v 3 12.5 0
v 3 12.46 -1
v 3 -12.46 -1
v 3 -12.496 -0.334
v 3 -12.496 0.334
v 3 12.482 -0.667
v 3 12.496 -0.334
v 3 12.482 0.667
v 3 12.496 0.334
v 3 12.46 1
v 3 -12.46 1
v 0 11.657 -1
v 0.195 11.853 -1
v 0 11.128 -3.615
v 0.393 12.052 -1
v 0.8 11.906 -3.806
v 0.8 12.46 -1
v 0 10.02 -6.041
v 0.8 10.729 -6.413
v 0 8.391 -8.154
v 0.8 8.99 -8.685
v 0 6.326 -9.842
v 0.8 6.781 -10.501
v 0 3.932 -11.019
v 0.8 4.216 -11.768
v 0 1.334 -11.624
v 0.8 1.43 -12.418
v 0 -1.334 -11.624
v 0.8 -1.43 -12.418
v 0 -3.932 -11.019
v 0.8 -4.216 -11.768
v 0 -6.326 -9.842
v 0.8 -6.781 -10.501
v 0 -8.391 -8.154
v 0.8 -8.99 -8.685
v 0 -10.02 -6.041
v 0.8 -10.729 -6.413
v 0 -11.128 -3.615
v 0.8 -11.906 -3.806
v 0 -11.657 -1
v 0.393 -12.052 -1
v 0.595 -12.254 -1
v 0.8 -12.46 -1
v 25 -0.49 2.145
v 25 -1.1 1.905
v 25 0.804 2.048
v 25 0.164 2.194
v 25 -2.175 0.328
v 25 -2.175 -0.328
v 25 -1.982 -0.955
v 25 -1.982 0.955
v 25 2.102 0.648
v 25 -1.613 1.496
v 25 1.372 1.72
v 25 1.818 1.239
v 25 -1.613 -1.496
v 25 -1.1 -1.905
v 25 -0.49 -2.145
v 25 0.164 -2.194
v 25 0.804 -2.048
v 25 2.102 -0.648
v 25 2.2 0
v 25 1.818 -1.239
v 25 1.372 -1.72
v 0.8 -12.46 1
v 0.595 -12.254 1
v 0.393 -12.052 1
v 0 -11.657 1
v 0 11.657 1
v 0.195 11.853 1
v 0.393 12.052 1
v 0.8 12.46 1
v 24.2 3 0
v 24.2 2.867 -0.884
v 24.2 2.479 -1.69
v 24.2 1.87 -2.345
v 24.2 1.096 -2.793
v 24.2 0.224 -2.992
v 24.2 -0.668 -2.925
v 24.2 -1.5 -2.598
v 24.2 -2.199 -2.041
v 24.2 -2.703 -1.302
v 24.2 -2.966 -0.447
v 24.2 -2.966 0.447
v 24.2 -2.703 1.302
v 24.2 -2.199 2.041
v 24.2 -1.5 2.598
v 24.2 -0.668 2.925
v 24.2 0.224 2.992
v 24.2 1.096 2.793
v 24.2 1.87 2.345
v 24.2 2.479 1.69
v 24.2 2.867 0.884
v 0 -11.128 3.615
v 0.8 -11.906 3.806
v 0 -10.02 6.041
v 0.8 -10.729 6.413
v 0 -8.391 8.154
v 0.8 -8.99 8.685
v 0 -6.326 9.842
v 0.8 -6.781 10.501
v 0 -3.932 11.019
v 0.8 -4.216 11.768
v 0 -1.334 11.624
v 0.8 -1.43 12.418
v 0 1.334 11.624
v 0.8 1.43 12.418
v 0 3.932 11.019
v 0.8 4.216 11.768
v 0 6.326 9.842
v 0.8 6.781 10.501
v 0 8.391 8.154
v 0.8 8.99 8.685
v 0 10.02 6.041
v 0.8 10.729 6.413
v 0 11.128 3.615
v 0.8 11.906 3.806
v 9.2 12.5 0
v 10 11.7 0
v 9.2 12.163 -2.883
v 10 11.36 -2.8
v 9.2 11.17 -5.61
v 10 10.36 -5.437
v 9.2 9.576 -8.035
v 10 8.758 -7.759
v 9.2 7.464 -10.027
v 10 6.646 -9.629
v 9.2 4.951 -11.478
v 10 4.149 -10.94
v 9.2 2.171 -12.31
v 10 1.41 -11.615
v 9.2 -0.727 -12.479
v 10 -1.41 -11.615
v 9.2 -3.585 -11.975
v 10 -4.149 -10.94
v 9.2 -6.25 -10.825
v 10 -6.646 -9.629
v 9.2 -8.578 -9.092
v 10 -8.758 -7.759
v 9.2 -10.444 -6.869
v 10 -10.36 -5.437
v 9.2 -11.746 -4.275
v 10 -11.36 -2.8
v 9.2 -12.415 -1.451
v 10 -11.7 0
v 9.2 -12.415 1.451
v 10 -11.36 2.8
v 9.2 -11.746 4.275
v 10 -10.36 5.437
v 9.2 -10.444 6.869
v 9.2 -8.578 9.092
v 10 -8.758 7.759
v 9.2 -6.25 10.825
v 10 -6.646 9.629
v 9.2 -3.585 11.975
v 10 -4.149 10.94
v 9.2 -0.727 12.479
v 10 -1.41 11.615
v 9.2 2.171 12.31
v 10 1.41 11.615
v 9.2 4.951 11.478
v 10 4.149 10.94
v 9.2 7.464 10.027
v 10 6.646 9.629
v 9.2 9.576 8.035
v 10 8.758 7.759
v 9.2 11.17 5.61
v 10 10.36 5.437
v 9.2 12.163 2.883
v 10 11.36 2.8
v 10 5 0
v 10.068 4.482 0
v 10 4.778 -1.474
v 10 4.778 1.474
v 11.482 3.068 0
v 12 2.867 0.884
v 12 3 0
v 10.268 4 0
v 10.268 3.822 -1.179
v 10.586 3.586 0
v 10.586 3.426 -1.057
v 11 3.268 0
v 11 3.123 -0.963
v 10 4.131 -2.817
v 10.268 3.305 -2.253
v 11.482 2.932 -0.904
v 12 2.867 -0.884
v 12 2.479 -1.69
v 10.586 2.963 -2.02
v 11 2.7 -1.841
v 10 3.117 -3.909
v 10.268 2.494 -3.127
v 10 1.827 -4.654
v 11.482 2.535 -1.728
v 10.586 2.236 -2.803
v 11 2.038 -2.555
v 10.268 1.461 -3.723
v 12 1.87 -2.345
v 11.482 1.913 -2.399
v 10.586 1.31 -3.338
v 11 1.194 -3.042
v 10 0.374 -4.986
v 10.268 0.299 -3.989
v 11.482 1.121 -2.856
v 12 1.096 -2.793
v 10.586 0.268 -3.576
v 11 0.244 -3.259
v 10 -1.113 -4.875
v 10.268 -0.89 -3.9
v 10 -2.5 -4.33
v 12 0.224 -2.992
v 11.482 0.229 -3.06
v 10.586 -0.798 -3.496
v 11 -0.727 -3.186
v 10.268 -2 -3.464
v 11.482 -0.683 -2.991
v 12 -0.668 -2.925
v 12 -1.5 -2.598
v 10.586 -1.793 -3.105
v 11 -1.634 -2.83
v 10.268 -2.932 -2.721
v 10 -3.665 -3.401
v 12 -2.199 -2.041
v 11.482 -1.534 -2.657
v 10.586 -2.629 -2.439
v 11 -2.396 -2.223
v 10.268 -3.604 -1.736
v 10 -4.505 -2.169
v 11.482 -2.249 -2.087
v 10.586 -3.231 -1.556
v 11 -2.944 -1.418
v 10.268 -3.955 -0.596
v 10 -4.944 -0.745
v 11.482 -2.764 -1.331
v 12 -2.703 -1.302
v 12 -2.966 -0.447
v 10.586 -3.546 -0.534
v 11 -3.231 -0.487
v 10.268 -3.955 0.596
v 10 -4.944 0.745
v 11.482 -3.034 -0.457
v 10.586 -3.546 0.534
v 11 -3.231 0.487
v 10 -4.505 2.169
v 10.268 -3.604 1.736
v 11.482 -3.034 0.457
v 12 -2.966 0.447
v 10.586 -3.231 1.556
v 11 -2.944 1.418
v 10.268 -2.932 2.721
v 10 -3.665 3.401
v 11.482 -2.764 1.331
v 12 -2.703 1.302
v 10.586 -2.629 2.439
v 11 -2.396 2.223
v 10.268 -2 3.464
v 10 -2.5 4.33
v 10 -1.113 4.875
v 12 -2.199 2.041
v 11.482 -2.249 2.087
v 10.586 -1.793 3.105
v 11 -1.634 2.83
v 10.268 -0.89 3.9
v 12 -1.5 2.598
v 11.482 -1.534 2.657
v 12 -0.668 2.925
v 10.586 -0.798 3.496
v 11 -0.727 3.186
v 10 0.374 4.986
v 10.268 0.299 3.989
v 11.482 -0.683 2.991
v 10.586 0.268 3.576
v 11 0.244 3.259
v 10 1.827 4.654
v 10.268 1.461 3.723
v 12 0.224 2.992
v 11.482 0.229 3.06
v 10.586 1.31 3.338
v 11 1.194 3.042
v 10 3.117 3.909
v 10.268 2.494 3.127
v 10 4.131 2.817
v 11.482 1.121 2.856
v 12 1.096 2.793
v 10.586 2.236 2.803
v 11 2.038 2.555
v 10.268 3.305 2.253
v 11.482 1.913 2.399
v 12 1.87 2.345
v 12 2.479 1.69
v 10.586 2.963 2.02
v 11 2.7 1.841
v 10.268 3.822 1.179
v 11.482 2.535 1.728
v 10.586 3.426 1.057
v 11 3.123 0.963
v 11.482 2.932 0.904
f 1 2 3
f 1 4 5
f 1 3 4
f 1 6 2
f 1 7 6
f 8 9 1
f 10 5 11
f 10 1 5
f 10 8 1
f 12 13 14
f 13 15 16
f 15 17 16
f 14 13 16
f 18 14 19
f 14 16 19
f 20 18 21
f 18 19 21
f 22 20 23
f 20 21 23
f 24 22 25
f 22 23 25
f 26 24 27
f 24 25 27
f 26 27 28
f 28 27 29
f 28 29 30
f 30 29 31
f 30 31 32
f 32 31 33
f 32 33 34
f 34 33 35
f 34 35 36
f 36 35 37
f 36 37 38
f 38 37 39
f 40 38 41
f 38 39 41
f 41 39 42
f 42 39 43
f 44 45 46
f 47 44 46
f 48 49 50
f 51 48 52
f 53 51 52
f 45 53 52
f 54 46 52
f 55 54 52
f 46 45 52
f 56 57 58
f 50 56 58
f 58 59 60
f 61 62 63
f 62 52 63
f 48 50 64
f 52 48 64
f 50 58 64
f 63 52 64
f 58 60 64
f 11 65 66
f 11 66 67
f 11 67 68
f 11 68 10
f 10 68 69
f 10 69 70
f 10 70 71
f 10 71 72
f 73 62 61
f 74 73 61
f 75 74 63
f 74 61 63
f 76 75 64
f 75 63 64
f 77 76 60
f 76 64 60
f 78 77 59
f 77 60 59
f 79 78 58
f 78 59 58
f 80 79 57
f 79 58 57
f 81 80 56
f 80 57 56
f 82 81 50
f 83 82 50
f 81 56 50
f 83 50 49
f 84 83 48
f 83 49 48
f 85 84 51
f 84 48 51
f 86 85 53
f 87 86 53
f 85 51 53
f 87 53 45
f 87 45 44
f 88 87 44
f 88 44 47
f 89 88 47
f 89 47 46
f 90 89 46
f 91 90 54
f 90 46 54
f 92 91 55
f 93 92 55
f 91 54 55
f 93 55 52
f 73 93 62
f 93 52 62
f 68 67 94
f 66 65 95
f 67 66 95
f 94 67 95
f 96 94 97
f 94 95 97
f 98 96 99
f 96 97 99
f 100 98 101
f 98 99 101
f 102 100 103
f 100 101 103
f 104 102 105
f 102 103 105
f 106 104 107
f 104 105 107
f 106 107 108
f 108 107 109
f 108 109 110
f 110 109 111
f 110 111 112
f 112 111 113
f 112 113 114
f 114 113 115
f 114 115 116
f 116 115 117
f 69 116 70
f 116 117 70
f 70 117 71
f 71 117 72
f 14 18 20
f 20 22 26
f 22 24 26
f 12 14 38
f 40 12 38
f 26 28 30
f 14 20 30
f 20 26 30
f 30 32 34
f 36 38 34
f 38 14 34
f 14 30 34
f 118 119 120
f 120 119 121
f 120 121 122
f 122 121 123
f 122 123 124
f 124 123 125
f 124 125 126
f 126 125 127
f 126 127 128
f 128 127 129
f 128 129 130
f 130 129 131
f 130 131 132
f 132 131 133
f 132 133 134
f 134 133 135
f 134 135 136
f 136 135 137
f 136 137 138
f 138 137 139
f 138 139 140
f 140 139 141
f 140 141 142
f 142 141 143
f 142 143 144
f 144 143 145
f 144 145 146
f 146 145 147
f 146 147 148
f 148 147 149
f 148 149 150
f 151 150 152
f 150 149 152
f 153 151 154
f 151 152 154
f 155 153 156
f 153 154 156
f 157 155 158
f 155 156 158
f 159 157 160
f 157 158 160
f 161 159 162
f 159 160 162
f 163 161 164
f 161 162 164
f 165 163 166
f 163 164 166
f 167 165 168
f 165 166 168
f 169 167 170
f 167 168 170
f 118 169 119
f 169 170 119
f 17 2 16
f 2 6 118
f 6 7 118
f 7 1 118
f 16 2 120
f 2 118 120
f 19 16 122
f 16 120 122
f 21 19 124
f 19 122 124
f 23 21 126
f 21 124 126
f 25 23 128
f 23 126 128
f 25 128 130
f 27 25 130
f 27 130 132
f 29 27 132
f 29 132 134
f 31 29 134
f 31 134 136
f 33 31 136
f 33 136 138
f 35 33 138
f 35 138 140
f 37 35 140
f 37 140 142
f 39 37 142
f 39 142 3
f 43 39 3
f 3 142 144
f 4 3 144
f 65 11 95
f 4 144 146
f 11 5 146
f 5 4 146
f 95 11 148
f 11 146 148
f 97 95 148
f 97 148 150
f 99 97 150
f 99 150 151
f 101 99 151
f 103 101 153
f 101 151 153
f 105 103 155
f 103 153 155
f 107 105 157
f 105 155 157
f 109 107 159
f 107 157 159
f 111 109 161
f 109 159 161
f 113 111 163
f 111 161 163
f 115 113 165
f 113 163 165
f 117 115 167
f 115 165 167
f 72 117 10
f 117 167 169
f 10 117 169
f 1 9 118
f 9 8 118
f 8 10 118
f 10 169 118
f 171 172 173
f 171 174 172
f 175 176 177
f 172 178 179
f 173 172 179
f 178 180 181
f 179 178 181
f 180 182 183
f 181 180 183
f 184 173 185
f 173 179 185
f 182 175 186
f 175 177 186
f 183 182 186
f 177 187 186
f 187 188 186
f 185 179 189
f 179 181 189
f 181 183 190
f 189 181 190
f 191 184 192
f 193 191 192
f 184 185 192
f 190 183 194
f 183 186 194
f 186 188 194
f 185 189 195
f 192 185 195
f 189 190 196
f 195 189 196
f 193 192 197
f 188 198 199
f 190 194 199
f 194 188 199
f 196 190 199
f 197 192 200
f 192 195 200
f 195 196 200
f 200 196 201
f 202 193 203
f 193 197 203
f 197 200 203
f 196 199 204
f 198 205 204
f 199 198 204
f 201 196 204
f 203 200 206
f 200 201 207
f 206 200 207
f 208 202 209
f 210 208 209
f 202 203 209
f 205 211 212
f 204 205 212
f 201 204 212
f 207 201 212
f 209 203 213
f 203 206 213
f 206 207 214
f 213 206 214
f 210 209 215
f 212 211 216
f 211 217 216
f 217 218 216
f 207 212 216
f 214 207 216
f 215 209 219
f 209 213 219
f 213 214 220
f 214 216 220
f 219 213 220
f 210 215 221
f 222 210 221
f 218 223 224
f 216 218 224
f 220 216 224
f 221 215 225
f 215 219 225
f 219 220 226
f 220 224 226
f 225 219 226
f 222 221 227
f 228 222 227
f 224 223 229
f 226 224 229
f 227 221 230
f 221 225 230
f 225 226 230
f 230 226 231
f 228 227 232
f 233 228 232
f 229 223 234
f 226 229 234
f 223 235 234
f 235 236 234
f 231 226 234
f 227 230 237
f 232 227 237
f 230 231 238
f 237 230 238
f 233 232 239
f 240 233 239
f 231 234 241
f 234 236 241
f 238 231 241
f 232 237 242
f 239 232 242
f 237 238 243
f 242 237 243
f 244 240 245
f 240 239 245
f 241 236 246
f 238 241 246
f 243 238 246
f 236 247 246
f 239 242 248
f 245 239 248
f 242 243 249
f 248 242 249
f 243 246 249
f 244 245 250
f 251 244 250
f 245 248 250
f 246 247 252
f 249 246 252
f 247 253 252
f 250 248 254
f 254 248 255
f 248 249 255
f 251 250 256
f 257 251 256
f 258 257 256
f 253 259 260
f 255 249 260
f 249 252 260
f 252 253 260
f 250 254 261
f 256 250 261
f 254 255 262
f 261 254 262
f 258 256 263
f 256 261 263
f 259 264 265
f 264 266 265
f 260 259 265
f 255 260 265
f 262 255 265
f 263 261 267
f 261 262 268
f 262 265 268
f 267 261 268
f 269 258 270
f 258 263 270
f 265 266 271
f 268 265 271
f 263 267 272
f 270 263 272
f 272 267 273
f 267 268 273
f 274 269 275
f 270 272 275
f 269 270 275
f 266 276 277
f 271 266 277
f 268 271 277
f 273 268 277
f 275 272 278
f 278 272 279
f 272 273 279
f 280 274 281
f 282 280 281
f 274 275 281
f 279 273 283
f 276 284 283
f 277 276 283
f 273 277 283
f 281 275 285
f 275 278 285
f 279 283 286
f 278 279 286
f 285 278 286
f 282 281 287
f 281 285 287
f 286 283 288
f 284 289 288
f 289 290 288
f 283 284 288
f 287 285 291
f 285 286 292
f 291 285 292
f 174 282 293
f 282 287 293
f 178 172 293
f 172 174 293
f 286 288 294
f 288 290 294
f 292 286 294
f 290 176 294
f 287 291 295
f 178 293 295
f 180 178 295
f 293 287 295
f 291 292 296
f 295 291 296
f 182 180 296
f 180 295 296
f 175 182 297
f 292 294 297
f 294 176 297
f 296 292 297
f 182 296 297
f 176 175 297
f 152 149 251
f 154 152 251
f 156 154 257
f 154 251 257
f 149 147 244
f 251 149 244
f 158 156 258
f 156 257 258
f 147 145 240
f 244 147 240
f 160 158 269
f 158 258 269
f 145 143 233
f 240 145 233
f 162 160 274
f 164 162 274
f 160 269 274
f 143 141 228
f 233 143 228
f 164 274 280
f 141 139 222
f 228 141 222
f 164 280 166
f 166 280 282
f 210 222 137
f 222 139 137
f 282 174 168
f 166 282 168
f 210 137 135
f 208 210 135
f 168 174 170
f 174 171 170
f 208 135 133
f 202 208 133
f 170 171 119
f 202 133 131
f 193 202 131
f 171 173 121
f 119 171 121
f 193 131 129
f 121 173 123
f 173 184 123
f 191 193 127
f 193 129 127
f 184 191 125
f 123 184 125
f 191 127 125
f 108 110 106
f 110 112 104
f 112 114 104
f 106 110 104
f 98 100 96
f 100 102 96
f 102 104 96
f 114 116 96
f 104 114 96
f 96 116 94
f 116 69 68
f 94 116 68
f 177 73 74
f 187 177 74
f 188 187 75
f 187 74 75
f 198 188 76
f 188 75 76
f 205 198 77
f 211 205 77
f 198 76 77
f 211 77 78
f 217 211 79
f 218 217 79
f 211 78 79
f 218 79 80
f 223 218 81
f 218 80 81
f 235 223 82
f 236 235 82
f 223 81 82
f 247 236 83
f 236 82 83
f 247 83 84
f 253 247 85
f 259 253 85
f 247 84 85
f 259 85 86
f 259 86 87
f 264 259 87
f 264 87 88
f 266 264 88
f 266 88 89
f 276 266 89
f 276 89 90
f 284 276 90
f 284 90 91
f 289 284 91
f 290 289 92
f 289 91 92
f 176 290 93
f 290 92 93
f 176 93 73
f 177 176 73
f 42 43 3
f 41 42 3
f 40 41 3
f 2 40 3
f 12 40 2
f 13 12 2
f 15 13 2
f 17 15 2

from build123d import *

# Parameters (mm, degrees)
CHANFRO1_SIZE         = 0.8
FILETE1_R             = 2
ESBO_O2_W             = 2
ESBO_O2_H             = 30
CORTE_EXTRUS_O1_DEPTH = 3


with BuildPart() as part:
    # Esboço1 → Revolução1 (revolve)
    with BuildSketch(Plane.XY):
        Polygon((0, 0), (0, 12.5), (10, 12.5), (10, 3), (25, 3), (25, 0), align=None)
    revolve(axis=Axis((25, 0, 0), (-1, 0, 0)))

    # Chanfro1
    chanfro1_edges = [part.edges().sort_by_distance(p)[0] for p in [
        (25, -3, 0),
        (10, -12.5, 0),
        (0, -12.5, 0),
    ]]
    chamfer(chanfro1_edges, length=CHANFRO1_SIZE)

    # Filete1
    filete1_edges = [part.edges().sort_by_distance(p)[0] for p in [
        (10, -3, 0),
    ]]
    fillet(filete1_edges, radius=FILETE1_R)

    # Esboço2 → Corte-extrusão1 (cut)
    with BuildSketch(Plane.ZY):
        Rectangle(ESBO_O2_W, ESBO_O2_H)
    extrude(amount=-CORTE_EXTRUS_O1_DEPTH, mode=Mode.SUBTRACT)


solid = part.part
